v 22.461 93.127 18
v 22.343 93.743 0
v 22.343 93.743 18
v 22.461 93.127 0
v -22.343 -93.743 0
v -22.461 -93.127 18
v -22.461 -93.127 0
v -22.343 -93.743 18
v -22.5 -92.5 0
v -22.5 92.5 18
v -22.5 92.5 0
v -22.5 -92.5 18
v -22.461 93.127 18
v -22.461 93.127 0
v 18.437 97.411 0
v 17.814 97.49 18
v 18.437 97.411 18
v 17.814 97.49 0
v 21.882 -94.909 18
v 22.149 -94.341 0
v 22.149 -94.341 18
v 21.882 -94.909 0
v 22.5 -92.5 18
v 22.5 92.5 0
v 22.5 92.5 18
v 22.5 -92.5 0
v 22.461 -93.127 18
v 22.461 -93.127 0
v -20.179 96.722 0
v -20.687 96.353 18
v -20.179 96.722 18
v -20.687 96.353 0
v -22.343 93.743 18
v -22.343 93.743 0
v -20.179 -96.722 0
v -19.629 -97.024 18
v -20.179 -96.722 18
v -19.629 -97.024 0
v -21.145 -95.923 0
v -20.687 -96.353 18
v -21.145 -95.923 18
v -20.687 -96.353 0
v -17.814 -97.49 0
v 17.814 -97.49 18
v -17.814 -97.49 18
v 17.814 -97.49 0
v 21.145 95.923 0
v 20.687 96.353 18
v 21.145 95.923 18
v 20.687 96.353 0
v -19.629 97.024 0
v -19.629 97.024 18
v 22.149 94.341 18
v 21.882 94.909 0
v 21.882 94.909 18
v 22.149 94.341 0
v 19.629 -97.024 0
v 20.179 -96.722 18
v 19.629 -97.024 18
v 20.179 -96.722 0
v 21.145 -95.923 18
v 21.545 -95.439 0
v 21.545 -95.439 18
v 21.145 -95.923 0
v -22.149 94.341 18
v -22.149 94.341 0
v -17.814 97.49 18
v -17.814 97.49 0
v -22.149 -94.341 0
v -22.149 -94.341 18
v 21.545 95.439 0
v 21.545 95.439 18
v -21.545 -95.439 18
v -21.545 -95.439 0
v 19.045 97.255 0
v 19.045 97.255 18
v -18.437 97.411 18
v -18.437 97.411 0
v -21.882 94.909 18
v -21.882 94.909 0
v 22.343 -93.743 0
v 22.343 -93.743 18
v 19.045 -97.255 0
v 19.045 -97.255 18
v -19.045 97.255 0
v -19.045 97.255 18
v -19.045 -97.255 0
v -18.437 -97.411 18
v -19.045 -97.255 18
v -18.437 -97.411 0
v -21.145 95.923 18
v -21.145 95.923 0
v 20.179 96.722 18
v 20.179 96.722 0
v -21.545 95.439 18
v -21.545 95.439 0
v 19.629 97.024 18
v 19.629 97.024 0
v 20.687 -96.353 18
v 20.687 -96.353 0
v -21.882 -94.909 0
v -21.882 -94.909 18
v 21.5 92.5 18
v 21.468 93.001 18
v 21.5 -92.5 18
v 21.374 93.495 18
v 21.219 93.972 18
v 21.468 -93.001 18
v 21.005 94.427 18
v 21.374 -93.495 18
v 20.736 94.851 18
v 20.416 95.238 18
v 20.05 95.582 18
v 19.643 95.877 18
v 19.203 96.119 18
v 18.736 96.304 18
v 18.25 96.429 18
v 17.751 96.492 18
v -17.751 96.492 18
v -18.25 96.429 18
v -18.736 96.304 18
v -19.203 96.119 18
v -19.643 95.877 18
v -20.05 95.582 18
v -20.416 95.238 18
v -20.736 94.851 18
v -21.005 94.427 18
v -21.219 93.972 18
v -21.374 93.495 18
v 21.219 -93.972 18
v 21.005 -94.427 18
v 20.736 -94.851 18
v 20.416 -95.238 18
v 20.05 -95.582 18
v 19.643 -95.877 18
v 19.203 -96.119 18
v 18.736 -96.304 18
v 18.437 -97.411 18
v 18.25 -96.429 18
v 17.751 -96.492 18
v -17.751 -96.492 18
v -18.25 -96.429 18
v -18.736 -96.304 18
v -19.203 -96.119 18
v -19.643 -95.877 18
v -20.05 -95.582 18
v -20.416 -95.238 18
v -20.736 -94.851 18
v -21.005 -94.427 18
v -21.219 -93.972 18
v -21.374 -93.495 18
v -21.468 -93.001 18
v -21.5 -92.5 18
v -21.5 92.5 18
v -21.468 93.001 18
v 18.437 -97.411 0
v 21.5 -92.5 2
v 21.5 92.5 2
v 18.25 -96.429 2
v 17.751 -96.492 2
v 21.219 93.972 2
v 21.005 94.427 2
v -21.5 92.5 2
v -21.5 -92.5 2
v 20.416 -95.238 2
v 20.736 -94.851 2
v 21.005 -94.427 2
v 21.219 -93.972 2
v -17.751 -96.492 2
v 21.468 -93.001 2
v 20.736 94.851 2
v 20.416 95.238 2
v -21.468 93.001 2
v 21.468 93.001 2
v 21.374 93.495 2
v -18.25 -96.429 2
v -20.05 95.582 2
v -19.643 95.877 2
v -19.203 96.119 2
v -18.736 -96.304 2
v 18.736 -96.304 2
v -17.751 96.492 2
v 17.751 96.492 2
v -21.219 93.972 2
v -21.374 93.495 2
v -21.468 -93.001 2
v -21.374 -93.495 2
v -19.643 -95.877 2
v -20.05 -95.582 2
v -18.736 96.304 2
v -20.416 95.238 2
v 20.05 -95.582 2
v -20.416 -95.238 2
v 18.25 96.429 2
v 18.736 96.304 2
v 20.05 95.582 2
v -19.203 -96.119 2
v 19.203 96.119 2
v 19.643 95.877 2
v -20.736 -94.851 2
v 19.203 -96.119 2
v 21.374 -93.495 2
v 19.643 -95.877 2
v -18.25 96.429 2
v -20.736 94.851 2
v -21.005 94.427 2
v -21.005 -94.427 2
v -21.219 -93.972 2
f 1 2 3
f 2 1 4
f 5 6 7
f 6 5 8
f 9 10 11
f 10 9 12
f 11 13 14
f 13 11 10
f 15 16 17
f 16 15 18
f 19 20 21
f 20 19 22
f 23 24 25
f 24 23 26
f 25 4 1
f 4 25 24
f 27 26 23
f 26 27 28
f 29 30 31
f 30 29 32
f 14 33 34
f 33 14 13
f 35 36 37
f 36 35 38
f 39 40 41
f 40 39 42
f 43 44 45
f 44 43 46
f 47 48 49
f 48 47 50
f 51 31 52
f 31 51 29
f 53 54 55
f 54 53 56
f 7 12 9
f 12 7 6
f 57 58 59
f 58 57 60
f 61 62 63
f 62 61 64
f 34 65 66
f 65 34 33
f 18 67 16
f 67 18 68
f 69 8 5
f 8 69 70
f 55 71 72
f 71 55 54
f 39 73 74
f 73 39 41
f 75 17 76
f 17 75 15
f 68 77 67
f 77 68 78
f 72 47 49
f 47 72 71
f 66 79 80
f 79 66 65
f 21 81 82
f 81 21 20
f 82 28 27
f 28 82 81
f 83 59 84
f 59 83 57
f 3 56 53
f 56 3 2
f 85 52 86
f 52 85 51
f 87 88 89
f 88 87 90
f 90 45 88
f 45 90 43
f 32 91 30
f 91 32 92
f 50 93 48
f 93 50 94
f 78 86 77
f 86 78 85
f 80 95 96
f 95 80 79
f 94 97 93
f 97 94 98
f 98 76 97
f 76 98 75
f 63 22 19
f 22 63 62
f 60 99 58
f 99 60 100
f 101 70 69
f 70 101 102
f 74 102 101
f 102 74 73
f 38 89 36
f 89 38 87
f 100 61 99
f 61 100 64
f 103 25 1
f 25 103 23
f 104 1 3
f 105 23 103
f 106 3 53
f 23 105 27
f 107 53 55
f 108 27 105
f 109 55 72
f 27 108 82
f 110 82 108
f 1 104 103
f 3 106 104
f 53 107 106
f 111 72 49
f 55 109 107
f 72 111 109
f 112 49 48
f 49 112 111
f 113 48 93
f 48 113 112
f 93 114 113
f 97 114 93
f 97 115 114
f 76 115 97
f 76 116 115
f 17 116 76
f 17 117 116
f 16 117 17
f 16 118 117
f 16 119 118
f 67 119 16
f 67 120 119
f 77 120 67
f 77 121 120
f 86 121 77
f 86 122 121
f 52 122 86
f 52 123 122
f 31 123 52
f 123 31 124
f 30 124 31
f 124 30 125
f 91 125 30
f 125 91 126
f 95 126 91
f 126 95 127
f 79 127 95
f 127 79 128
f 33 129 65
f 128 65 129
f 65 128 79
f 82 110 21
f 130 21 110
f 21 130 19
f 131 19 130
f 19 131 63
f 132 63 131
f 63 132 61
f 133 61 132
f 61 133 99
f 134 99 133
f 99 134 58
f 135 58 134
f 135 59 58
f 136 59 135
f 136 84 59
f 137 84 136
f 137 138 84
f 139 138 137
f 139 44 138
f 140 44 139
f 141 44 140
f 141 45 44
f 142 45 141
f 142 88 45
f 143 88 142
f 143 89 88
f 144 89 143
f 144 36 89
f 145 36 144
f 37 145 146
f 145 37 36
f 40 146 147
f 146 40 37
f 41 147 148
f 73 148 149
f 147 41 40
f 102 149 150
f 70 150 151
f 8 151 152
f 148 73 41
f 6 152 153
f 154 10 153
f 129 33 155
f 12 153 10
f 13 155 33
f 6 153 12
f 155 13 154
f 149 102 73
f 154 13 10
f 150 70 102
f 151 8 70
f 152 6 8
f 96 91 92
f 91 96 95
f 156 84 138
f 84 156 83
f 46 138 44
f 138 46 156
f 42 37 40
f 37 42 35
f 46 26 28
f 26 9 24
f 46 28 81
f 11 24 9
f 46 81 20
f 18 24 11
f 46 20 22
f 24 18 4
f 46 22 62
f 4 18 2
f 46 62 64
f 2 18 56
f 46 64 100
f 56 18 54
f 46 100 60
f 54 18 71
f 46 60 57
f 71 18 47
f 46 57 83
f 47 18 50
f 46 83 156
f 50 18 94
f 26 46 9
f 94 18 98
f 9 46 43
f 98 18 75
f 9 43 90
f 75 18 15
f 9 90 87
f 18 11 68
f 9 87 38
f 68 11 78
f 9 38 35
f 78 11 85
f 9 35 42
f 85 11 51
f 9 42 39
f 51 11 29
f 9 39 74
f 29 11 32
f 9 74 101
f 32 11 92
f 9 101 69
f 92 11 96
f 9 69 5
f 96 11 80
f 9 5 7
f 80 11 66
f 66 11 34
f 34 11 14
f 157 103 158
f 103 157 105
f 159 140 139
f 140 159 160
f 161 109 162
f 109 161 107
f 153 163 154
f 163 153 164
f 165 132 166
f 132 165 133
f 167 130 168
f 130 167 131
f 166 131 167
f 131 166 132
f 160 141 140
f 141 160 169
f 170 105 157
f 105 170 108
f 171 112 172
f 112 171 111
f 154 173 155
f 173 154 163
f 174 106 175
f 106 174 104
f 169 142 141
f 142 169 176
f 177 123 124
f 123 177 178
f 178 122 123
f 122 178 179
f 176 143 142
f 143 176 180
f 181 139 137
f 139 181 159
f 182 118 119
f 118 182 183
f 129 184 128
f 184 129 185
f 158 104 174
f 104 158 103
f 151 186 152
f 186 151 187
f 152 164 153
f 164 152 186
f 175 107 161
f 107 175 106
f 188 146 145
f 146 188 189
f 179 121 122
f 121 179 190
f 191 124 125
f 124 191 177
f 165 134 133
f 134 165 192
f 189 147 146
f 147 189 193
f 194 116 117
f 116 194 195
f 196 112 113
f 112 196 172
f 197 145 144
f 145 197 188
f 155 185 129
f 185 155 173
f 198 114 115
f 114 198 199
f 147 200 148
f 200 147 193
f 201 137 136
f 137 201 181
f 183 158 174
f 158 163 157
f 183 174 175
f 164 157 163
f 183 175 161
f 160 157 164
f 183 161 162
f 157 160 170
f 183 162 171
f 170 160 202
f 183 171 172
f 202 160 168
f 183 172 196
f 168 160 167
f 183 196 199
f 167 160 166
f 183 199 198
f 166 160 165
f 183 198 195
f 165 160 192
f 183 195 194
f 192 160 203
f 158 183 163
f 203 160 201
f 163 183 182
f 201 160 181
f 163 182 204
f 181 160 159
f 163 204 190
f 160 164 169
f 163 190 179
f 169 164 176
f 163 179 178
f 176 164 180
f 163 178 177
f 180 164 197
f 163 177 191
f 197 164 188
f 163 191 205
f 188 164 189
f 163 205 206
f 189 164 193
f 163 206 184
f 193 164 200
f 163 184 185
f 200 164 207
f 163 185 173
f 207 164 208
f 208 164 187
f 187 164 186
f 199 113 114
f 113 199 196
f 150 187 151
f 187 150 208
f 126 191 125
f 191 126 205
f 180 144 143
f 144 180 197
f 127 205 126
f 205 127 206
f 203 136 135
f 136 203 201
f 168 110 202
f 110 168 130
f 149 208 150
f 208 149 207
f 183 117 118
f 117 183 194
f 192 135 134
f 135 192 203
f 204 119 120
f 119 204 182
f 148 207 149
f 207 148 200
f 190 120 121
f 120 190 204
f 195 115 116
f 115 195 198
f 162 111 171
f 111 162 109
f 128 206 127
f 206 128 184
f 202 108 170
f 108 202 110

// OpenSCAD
$fn = 50;


difference() {
	union() {
		hull() {
			translate(v = [-17.5000000000, 92.5000000000, 0]) {
				cylinder(h = 18, r = 5);
			}
			translate(v = [17.5000000000, 92.5000000000, 0]) {
				cylinder(h = 18, r = 5);
			}
			translate(v = [-17.5000000000, -92.5000000000, 0]) {
				cylinder(h = 18, r = 5);
			}
			translate(v = [17.5000000000, -92.5000000000, 0]) {
				cylinder(h = 18, r = 5);
			}
		}
	}
	union() {
		translate(v = [0, 0, 2]) {
			hull() {
				translate(v = [-17.5000000000, 92.5000000000, 0]) {
					cylinder(h = 16, r = 4);
				}
				translate(v = [17.5000000000, 92.5000000000, 0]) {
					cylinder(h = 16, r = 4);
				}
				translate(v = [-17.5000000000, -92.5000000000, 0]) {
					cylinder(h = 16, r = 4);
				}
				translate(v = [17.5000000000, -92.5000000000, 0]) {
					cylinder(h = 16, r = 4);
				}
			}
		}
	}
}
